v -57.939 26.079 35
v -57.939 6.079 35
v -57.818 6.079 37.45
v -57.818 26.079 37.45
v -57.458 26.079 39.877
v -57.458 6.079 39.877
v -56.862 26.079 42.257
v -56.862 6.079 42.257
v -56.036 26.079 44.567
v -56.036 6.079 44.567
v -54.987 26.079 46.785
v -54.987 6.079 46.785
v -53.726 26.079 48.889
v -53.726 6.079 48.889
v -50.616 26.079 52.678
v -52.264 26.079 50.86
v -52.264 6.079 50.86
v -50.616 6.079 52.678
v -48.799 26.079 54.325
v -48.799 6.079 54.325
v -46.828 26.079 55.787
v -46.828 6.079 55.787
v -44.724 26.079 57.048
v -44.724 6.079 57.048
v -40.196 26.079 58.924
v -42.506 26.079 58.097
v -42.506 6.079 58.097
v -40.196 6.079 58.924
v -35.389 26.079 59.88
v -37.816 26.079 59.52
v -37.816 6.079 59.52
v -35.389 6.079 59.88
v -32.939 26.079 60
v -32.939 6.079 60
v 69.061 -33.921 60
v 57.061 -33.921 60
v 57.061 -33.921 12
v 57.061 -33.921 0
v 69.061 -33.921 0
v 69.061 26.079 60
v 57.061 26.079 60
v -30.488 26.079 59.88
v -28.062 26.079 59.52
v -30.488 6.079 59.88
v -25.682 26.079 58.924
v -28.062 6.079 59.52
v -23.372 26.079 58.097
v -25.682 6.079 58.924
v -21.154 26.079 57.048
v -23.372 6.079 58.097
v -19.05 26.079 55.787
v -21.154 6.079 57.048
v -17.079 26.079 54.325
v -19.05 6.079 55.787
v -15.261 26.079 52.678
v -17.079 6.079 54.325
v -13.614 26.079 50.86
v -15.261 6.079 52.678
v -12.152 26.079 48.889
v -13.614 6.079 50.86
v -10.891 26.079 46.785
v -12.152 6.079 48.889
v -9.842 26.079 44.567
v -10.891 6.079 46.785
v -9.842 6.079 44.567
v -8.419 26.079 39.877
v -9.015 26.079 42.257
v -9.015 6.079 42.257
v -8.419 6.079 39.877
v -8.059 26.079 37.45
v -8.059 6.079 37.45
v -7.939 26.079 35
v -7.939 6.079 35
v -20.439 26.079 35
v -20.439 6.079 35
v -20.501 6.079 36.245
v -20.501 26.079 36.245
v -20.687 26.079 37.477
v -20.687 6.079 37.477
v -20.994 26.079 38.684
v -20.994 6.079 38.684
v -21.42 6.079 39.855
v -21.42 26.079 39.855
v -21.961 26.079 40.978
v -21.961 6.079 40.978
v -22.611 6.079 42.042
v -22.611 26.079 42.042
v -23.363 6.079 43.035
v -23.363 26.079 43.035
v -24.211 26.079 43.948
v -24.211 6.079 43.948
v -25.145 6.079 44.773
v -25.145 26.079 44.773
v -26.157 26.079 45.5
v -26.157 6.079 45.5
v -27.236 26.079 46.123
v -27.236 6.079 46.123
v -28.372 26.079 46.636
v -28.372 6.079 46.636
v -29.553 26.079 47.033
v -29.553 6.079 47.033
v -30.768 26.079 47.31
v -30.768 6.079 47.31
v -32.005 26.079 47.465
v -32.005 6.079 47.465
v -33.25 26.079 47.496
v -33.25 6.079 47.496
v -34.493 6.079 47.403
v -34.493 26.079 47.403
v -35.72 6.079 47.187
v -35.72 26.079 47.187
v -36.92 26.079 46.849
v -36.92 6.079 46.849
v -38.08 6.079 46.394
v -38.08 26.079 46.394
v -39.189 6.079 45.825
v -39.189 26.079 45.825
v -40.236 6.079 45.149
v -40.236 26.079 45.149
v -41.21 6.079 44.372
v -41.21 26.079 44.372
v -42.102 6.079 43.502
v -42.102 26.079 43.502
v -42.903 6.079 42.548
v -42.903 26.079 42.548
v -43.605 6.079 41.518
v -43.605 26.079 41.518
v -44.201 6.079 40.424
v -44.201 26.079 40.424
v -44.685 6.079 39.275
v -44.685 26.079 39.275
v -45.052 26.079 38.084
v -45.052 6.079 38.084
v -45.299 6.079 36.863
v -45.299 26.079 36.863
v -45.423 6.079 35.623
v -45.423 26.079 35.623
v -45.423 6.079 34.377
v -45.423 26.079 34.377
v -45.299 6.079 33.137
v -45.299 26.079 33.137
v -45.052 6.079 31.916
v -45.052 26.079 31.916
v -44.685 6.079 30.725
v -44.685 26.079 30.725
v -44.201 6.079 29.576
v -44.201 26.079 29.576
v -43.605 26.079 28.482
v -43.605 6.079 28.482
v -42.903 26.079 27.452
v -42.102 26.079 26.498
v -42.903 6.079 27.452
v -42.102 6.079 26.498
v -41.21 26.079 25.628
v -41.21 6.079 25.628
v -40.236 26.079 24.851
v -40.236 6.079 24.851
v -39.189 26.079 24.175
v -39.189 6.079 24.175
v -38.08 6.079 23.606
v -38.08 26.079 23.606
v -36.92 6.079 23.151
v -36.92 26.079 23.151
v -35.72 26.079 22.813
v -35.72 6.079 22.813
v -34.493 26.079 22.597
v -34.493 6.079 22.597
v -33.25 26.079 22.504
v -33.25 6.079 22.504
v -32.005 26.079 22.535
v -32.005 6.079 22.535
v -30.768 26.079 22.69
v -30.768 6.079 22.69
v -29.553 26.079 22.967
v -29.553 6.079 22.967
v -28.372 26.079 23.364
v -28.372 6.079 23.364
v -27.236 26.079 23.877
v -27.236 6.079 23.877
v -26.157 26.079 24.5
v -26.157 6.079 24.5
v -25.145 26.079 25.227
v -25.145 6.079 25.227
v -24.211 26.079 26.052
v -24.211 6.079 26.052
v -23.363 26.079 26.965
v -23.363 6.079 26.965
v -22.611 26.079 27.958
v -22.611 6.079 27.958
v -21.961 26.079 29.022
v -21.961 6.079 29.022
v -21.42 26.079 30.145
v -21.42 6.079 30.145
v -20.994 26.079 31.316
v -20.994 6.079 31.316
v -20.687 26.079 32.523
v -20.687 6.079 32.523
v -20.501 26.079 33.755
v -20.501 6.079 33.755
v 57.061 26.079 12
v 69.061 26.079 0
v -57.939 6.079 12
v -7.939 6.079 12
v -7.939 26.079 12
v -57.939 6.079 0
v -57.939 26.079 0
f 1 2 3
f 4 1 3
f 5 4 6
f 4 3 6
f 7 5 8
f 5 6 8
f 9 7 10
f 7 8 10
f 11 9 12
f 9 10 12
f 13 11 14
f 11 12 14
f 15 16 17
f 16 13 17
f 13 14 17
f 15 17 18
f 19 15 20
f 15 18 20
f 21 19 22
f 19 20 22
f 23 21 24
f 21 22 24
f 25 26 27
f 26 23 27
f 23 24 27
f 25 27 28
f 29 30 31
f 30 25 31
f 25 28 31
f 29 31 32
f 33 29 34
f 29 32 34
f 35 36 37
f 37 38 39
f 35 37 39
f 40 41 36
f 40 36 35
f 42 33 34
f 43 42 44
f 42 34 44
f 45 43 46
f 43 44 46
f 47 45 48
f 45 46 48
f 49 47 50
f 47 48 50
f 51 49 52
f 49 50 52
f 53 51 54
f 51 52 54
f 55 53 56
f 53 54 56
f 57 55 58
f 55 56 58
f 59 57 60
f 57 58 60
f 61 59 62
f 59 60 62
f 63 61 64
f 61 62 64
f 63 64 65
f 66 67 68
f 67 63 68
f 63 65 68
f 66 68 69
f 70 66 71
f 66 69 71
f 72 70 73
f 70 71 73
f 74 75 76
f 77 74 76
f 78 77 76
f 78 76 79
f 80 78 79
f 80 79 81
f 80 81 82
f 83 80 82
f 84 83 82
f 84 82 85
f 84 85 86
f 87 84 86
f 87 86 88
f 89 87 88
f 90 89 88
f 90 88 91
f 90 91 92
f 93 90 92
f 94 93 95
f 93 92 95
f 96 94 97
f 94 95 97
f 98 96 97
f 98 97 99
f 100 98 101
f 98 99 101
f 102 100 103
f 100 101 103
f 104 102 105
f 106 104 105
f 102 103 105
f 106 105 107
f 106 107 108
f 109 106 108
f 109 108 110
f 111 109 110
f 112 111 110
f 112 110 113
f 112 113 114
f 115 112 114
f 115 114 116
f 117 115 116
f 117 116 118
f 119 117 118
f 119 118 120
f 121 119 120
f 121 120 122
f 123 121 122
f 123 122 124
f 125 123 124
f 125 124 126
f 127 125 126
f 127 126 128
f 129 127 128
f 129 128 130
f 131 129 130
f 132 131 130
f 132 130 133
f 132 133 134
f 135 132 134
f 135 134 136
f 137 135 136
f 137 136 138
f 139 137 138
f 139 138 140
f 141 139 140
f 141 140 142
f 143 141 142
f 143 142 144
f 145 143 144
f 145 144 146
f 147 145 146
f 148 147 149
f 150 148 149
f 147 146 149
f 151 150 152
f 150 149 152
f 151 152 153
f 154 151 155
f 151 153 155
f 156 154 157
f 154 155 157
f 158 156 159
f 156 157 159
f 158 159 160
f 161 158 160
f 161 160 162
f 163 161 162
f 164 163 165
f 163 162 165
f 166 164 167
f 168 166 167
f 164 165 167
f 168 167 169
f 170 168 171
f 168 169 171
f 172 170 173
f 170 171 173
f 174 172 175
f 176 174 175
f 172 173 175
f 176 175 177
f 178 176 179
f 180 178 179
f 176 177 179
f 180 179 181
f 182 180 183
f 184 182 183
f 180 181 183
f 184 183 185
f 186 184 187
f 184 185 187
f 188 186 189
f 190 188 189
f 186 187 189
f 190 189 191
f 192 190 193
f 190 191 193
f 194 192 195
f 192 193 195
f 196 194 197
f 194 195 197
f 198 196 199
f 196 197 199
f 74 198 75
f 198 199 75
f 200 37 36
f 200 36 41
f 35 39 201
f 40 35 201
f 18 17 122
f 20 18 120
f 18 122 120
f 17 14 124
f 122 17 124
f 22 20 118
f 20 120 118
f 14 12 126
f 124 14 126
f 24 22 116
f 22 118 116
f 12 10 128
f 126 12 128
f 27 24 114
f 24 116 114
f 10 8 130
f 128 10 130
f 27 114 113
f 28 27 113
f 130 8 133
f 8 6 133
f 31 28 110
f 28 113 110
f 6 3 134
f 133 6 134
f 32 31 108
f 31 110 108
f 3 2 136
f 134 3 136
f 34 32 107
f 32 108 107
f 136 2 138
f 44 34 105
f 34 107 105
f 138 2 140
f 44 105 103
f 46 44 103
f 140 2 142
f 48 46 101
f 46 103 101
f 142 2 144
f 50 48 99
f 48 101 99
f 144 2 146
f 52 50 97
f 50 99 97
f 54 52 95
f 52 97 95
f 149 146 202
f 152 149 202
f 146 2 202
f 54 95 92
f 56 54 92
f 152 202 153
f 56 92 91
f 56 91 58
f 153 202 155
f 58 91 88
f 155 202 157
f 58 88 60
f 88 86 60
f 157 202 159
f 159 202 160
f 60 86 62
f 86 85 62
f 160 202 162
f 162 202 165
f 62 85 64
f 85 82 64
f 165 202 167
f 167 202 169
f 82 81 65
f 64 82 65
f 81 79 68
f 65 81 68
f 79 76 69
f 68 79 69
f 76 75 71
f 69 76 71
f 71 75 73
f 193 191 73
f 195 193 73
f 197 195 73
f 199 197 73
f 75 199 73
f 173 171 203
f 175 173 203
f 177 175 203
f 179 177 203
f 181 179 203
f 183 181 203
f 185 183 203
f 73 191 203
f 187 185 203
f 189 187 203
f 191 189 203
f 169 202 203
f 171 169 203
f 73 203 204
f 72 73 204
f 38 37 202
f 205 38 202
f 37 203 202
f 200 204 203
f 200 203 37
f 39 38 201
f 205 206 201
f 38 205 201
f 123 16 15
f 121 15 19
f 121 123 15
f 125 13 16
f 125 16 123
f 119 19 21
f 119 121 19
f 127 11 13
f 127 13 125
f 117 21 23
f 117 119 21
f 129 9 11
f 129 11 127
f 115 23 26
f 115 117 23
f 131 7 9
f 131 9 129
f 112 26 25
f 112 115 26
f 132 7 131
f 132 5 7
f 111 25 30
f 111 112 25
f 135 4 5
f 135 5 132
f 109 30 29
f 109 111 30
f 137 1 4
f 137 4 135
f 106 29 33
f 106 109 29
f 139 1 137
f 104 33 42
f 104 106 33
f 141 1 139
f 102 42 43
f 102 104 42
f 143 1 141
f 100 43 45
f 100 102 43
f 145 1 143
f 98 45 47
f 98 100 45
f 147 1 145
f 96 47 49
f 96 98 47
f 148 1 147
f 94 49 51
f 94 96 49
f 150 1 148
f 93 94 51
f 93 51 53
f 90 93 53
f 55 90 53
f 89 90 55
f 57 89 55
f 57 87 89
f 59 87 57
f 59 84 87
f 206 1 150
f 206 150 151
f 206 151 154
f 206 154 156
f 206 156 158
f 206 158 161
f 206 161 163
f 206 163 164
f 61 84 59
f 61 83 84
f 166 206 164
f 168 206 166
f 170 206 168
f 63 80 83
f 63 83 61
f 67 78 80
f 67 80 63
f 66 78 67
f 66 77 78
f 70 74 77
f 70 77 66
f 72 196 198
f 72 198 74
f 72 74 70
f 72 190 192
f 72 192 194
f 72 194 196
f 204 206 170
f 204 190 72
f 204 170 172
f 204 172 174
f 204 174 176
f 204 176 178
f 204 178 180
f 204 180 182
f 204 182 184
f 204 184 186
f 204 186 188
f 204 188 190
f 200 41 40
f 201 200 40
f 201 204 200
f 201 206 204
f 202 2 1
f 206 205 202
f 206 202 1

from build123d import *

# Parameters (mm, degrees)
F0_W      = 115
F0_H      = 60
F1_DEPTH  = 12
F0_W_2    = 12
F2_DEPTH  = 60
F4_DEPTH  = 25
F5_W      = 50
F5_H      = 20
F6_DEPTH  = 48
F8_DEPTH  = 25
F9_R      = 12.5
F10_DEPTH = 25


with BuildPart() as f1:
    # F0 (on Top) → F1 (new body)
    with BuildSketch(Plane.XY):
        with Locations((-0.438802, -3.920759)):
            Rectangle(F0_W, F0_H)
    extrude(amount=F1_DEPTH)

    # F0 (on Top) → F2 (join)
    with BuildSketch(Plane.XY):
        with Locations((63.061198, -3.920759)):
            Rectangle(F0_W_2, F0_H)
    extrude(amount=F2_DEPTH)

    # F3 (on face) → F4 (cut)
    with BuildSketch(Plane.XY.offset(12)):
        Polygon((57.061198, -33.920759), (-57.938802, 6.079241), (-57.938802, -33.920759), align=None)
    extrude(amount=-F4_DEPTH, mode=Mode.SUBTRACT)

    # F5 (on face) → F6 (join)
    with BuildSketch(Plane.XY.offset(12)):
        with Locations((-32.938802, 16.079241)):
            Rectangle(F5_W, F5_H)
    extrude(amount=F6_DEPTH)

    # F7 (on face) → F8 (cut)
    with BuildSketch(Plane.XZ.offset(-6.079241)):
        with BuildLine():
            Line((-57.938802, 60), (-57.938802, 35))
            ThreePointArc((-57.938802, 35), (-50.616471, 52.67767), (-32.938802, 60))
            Line((-32.938802, 60), (-57.938802, 60))
        make_face()
        with BuildLine():
            Line((-7.938802, 60), (-32.938802, 60))
            ThreePointArc((-32.938802, 60), (-15.261132, 52.67767), (-7.938802, 35))
            Line((-7.938802, 35), (-7.938802, 60))
        make_face()
    extrude(amount=-F8_DEPTH, mode=Mode.SUBTRACT)

    # F9 (on face) → F10 (cut)
    with BuildSketch(Plane.XZ.offset(-6.079241)):
        with Locations((-32.938802, 35)):
            Circle(F9_R)
    extrude(amount=-F10_DEPTH, mode=Mode.SUBTRACT)


solid = f1.part
